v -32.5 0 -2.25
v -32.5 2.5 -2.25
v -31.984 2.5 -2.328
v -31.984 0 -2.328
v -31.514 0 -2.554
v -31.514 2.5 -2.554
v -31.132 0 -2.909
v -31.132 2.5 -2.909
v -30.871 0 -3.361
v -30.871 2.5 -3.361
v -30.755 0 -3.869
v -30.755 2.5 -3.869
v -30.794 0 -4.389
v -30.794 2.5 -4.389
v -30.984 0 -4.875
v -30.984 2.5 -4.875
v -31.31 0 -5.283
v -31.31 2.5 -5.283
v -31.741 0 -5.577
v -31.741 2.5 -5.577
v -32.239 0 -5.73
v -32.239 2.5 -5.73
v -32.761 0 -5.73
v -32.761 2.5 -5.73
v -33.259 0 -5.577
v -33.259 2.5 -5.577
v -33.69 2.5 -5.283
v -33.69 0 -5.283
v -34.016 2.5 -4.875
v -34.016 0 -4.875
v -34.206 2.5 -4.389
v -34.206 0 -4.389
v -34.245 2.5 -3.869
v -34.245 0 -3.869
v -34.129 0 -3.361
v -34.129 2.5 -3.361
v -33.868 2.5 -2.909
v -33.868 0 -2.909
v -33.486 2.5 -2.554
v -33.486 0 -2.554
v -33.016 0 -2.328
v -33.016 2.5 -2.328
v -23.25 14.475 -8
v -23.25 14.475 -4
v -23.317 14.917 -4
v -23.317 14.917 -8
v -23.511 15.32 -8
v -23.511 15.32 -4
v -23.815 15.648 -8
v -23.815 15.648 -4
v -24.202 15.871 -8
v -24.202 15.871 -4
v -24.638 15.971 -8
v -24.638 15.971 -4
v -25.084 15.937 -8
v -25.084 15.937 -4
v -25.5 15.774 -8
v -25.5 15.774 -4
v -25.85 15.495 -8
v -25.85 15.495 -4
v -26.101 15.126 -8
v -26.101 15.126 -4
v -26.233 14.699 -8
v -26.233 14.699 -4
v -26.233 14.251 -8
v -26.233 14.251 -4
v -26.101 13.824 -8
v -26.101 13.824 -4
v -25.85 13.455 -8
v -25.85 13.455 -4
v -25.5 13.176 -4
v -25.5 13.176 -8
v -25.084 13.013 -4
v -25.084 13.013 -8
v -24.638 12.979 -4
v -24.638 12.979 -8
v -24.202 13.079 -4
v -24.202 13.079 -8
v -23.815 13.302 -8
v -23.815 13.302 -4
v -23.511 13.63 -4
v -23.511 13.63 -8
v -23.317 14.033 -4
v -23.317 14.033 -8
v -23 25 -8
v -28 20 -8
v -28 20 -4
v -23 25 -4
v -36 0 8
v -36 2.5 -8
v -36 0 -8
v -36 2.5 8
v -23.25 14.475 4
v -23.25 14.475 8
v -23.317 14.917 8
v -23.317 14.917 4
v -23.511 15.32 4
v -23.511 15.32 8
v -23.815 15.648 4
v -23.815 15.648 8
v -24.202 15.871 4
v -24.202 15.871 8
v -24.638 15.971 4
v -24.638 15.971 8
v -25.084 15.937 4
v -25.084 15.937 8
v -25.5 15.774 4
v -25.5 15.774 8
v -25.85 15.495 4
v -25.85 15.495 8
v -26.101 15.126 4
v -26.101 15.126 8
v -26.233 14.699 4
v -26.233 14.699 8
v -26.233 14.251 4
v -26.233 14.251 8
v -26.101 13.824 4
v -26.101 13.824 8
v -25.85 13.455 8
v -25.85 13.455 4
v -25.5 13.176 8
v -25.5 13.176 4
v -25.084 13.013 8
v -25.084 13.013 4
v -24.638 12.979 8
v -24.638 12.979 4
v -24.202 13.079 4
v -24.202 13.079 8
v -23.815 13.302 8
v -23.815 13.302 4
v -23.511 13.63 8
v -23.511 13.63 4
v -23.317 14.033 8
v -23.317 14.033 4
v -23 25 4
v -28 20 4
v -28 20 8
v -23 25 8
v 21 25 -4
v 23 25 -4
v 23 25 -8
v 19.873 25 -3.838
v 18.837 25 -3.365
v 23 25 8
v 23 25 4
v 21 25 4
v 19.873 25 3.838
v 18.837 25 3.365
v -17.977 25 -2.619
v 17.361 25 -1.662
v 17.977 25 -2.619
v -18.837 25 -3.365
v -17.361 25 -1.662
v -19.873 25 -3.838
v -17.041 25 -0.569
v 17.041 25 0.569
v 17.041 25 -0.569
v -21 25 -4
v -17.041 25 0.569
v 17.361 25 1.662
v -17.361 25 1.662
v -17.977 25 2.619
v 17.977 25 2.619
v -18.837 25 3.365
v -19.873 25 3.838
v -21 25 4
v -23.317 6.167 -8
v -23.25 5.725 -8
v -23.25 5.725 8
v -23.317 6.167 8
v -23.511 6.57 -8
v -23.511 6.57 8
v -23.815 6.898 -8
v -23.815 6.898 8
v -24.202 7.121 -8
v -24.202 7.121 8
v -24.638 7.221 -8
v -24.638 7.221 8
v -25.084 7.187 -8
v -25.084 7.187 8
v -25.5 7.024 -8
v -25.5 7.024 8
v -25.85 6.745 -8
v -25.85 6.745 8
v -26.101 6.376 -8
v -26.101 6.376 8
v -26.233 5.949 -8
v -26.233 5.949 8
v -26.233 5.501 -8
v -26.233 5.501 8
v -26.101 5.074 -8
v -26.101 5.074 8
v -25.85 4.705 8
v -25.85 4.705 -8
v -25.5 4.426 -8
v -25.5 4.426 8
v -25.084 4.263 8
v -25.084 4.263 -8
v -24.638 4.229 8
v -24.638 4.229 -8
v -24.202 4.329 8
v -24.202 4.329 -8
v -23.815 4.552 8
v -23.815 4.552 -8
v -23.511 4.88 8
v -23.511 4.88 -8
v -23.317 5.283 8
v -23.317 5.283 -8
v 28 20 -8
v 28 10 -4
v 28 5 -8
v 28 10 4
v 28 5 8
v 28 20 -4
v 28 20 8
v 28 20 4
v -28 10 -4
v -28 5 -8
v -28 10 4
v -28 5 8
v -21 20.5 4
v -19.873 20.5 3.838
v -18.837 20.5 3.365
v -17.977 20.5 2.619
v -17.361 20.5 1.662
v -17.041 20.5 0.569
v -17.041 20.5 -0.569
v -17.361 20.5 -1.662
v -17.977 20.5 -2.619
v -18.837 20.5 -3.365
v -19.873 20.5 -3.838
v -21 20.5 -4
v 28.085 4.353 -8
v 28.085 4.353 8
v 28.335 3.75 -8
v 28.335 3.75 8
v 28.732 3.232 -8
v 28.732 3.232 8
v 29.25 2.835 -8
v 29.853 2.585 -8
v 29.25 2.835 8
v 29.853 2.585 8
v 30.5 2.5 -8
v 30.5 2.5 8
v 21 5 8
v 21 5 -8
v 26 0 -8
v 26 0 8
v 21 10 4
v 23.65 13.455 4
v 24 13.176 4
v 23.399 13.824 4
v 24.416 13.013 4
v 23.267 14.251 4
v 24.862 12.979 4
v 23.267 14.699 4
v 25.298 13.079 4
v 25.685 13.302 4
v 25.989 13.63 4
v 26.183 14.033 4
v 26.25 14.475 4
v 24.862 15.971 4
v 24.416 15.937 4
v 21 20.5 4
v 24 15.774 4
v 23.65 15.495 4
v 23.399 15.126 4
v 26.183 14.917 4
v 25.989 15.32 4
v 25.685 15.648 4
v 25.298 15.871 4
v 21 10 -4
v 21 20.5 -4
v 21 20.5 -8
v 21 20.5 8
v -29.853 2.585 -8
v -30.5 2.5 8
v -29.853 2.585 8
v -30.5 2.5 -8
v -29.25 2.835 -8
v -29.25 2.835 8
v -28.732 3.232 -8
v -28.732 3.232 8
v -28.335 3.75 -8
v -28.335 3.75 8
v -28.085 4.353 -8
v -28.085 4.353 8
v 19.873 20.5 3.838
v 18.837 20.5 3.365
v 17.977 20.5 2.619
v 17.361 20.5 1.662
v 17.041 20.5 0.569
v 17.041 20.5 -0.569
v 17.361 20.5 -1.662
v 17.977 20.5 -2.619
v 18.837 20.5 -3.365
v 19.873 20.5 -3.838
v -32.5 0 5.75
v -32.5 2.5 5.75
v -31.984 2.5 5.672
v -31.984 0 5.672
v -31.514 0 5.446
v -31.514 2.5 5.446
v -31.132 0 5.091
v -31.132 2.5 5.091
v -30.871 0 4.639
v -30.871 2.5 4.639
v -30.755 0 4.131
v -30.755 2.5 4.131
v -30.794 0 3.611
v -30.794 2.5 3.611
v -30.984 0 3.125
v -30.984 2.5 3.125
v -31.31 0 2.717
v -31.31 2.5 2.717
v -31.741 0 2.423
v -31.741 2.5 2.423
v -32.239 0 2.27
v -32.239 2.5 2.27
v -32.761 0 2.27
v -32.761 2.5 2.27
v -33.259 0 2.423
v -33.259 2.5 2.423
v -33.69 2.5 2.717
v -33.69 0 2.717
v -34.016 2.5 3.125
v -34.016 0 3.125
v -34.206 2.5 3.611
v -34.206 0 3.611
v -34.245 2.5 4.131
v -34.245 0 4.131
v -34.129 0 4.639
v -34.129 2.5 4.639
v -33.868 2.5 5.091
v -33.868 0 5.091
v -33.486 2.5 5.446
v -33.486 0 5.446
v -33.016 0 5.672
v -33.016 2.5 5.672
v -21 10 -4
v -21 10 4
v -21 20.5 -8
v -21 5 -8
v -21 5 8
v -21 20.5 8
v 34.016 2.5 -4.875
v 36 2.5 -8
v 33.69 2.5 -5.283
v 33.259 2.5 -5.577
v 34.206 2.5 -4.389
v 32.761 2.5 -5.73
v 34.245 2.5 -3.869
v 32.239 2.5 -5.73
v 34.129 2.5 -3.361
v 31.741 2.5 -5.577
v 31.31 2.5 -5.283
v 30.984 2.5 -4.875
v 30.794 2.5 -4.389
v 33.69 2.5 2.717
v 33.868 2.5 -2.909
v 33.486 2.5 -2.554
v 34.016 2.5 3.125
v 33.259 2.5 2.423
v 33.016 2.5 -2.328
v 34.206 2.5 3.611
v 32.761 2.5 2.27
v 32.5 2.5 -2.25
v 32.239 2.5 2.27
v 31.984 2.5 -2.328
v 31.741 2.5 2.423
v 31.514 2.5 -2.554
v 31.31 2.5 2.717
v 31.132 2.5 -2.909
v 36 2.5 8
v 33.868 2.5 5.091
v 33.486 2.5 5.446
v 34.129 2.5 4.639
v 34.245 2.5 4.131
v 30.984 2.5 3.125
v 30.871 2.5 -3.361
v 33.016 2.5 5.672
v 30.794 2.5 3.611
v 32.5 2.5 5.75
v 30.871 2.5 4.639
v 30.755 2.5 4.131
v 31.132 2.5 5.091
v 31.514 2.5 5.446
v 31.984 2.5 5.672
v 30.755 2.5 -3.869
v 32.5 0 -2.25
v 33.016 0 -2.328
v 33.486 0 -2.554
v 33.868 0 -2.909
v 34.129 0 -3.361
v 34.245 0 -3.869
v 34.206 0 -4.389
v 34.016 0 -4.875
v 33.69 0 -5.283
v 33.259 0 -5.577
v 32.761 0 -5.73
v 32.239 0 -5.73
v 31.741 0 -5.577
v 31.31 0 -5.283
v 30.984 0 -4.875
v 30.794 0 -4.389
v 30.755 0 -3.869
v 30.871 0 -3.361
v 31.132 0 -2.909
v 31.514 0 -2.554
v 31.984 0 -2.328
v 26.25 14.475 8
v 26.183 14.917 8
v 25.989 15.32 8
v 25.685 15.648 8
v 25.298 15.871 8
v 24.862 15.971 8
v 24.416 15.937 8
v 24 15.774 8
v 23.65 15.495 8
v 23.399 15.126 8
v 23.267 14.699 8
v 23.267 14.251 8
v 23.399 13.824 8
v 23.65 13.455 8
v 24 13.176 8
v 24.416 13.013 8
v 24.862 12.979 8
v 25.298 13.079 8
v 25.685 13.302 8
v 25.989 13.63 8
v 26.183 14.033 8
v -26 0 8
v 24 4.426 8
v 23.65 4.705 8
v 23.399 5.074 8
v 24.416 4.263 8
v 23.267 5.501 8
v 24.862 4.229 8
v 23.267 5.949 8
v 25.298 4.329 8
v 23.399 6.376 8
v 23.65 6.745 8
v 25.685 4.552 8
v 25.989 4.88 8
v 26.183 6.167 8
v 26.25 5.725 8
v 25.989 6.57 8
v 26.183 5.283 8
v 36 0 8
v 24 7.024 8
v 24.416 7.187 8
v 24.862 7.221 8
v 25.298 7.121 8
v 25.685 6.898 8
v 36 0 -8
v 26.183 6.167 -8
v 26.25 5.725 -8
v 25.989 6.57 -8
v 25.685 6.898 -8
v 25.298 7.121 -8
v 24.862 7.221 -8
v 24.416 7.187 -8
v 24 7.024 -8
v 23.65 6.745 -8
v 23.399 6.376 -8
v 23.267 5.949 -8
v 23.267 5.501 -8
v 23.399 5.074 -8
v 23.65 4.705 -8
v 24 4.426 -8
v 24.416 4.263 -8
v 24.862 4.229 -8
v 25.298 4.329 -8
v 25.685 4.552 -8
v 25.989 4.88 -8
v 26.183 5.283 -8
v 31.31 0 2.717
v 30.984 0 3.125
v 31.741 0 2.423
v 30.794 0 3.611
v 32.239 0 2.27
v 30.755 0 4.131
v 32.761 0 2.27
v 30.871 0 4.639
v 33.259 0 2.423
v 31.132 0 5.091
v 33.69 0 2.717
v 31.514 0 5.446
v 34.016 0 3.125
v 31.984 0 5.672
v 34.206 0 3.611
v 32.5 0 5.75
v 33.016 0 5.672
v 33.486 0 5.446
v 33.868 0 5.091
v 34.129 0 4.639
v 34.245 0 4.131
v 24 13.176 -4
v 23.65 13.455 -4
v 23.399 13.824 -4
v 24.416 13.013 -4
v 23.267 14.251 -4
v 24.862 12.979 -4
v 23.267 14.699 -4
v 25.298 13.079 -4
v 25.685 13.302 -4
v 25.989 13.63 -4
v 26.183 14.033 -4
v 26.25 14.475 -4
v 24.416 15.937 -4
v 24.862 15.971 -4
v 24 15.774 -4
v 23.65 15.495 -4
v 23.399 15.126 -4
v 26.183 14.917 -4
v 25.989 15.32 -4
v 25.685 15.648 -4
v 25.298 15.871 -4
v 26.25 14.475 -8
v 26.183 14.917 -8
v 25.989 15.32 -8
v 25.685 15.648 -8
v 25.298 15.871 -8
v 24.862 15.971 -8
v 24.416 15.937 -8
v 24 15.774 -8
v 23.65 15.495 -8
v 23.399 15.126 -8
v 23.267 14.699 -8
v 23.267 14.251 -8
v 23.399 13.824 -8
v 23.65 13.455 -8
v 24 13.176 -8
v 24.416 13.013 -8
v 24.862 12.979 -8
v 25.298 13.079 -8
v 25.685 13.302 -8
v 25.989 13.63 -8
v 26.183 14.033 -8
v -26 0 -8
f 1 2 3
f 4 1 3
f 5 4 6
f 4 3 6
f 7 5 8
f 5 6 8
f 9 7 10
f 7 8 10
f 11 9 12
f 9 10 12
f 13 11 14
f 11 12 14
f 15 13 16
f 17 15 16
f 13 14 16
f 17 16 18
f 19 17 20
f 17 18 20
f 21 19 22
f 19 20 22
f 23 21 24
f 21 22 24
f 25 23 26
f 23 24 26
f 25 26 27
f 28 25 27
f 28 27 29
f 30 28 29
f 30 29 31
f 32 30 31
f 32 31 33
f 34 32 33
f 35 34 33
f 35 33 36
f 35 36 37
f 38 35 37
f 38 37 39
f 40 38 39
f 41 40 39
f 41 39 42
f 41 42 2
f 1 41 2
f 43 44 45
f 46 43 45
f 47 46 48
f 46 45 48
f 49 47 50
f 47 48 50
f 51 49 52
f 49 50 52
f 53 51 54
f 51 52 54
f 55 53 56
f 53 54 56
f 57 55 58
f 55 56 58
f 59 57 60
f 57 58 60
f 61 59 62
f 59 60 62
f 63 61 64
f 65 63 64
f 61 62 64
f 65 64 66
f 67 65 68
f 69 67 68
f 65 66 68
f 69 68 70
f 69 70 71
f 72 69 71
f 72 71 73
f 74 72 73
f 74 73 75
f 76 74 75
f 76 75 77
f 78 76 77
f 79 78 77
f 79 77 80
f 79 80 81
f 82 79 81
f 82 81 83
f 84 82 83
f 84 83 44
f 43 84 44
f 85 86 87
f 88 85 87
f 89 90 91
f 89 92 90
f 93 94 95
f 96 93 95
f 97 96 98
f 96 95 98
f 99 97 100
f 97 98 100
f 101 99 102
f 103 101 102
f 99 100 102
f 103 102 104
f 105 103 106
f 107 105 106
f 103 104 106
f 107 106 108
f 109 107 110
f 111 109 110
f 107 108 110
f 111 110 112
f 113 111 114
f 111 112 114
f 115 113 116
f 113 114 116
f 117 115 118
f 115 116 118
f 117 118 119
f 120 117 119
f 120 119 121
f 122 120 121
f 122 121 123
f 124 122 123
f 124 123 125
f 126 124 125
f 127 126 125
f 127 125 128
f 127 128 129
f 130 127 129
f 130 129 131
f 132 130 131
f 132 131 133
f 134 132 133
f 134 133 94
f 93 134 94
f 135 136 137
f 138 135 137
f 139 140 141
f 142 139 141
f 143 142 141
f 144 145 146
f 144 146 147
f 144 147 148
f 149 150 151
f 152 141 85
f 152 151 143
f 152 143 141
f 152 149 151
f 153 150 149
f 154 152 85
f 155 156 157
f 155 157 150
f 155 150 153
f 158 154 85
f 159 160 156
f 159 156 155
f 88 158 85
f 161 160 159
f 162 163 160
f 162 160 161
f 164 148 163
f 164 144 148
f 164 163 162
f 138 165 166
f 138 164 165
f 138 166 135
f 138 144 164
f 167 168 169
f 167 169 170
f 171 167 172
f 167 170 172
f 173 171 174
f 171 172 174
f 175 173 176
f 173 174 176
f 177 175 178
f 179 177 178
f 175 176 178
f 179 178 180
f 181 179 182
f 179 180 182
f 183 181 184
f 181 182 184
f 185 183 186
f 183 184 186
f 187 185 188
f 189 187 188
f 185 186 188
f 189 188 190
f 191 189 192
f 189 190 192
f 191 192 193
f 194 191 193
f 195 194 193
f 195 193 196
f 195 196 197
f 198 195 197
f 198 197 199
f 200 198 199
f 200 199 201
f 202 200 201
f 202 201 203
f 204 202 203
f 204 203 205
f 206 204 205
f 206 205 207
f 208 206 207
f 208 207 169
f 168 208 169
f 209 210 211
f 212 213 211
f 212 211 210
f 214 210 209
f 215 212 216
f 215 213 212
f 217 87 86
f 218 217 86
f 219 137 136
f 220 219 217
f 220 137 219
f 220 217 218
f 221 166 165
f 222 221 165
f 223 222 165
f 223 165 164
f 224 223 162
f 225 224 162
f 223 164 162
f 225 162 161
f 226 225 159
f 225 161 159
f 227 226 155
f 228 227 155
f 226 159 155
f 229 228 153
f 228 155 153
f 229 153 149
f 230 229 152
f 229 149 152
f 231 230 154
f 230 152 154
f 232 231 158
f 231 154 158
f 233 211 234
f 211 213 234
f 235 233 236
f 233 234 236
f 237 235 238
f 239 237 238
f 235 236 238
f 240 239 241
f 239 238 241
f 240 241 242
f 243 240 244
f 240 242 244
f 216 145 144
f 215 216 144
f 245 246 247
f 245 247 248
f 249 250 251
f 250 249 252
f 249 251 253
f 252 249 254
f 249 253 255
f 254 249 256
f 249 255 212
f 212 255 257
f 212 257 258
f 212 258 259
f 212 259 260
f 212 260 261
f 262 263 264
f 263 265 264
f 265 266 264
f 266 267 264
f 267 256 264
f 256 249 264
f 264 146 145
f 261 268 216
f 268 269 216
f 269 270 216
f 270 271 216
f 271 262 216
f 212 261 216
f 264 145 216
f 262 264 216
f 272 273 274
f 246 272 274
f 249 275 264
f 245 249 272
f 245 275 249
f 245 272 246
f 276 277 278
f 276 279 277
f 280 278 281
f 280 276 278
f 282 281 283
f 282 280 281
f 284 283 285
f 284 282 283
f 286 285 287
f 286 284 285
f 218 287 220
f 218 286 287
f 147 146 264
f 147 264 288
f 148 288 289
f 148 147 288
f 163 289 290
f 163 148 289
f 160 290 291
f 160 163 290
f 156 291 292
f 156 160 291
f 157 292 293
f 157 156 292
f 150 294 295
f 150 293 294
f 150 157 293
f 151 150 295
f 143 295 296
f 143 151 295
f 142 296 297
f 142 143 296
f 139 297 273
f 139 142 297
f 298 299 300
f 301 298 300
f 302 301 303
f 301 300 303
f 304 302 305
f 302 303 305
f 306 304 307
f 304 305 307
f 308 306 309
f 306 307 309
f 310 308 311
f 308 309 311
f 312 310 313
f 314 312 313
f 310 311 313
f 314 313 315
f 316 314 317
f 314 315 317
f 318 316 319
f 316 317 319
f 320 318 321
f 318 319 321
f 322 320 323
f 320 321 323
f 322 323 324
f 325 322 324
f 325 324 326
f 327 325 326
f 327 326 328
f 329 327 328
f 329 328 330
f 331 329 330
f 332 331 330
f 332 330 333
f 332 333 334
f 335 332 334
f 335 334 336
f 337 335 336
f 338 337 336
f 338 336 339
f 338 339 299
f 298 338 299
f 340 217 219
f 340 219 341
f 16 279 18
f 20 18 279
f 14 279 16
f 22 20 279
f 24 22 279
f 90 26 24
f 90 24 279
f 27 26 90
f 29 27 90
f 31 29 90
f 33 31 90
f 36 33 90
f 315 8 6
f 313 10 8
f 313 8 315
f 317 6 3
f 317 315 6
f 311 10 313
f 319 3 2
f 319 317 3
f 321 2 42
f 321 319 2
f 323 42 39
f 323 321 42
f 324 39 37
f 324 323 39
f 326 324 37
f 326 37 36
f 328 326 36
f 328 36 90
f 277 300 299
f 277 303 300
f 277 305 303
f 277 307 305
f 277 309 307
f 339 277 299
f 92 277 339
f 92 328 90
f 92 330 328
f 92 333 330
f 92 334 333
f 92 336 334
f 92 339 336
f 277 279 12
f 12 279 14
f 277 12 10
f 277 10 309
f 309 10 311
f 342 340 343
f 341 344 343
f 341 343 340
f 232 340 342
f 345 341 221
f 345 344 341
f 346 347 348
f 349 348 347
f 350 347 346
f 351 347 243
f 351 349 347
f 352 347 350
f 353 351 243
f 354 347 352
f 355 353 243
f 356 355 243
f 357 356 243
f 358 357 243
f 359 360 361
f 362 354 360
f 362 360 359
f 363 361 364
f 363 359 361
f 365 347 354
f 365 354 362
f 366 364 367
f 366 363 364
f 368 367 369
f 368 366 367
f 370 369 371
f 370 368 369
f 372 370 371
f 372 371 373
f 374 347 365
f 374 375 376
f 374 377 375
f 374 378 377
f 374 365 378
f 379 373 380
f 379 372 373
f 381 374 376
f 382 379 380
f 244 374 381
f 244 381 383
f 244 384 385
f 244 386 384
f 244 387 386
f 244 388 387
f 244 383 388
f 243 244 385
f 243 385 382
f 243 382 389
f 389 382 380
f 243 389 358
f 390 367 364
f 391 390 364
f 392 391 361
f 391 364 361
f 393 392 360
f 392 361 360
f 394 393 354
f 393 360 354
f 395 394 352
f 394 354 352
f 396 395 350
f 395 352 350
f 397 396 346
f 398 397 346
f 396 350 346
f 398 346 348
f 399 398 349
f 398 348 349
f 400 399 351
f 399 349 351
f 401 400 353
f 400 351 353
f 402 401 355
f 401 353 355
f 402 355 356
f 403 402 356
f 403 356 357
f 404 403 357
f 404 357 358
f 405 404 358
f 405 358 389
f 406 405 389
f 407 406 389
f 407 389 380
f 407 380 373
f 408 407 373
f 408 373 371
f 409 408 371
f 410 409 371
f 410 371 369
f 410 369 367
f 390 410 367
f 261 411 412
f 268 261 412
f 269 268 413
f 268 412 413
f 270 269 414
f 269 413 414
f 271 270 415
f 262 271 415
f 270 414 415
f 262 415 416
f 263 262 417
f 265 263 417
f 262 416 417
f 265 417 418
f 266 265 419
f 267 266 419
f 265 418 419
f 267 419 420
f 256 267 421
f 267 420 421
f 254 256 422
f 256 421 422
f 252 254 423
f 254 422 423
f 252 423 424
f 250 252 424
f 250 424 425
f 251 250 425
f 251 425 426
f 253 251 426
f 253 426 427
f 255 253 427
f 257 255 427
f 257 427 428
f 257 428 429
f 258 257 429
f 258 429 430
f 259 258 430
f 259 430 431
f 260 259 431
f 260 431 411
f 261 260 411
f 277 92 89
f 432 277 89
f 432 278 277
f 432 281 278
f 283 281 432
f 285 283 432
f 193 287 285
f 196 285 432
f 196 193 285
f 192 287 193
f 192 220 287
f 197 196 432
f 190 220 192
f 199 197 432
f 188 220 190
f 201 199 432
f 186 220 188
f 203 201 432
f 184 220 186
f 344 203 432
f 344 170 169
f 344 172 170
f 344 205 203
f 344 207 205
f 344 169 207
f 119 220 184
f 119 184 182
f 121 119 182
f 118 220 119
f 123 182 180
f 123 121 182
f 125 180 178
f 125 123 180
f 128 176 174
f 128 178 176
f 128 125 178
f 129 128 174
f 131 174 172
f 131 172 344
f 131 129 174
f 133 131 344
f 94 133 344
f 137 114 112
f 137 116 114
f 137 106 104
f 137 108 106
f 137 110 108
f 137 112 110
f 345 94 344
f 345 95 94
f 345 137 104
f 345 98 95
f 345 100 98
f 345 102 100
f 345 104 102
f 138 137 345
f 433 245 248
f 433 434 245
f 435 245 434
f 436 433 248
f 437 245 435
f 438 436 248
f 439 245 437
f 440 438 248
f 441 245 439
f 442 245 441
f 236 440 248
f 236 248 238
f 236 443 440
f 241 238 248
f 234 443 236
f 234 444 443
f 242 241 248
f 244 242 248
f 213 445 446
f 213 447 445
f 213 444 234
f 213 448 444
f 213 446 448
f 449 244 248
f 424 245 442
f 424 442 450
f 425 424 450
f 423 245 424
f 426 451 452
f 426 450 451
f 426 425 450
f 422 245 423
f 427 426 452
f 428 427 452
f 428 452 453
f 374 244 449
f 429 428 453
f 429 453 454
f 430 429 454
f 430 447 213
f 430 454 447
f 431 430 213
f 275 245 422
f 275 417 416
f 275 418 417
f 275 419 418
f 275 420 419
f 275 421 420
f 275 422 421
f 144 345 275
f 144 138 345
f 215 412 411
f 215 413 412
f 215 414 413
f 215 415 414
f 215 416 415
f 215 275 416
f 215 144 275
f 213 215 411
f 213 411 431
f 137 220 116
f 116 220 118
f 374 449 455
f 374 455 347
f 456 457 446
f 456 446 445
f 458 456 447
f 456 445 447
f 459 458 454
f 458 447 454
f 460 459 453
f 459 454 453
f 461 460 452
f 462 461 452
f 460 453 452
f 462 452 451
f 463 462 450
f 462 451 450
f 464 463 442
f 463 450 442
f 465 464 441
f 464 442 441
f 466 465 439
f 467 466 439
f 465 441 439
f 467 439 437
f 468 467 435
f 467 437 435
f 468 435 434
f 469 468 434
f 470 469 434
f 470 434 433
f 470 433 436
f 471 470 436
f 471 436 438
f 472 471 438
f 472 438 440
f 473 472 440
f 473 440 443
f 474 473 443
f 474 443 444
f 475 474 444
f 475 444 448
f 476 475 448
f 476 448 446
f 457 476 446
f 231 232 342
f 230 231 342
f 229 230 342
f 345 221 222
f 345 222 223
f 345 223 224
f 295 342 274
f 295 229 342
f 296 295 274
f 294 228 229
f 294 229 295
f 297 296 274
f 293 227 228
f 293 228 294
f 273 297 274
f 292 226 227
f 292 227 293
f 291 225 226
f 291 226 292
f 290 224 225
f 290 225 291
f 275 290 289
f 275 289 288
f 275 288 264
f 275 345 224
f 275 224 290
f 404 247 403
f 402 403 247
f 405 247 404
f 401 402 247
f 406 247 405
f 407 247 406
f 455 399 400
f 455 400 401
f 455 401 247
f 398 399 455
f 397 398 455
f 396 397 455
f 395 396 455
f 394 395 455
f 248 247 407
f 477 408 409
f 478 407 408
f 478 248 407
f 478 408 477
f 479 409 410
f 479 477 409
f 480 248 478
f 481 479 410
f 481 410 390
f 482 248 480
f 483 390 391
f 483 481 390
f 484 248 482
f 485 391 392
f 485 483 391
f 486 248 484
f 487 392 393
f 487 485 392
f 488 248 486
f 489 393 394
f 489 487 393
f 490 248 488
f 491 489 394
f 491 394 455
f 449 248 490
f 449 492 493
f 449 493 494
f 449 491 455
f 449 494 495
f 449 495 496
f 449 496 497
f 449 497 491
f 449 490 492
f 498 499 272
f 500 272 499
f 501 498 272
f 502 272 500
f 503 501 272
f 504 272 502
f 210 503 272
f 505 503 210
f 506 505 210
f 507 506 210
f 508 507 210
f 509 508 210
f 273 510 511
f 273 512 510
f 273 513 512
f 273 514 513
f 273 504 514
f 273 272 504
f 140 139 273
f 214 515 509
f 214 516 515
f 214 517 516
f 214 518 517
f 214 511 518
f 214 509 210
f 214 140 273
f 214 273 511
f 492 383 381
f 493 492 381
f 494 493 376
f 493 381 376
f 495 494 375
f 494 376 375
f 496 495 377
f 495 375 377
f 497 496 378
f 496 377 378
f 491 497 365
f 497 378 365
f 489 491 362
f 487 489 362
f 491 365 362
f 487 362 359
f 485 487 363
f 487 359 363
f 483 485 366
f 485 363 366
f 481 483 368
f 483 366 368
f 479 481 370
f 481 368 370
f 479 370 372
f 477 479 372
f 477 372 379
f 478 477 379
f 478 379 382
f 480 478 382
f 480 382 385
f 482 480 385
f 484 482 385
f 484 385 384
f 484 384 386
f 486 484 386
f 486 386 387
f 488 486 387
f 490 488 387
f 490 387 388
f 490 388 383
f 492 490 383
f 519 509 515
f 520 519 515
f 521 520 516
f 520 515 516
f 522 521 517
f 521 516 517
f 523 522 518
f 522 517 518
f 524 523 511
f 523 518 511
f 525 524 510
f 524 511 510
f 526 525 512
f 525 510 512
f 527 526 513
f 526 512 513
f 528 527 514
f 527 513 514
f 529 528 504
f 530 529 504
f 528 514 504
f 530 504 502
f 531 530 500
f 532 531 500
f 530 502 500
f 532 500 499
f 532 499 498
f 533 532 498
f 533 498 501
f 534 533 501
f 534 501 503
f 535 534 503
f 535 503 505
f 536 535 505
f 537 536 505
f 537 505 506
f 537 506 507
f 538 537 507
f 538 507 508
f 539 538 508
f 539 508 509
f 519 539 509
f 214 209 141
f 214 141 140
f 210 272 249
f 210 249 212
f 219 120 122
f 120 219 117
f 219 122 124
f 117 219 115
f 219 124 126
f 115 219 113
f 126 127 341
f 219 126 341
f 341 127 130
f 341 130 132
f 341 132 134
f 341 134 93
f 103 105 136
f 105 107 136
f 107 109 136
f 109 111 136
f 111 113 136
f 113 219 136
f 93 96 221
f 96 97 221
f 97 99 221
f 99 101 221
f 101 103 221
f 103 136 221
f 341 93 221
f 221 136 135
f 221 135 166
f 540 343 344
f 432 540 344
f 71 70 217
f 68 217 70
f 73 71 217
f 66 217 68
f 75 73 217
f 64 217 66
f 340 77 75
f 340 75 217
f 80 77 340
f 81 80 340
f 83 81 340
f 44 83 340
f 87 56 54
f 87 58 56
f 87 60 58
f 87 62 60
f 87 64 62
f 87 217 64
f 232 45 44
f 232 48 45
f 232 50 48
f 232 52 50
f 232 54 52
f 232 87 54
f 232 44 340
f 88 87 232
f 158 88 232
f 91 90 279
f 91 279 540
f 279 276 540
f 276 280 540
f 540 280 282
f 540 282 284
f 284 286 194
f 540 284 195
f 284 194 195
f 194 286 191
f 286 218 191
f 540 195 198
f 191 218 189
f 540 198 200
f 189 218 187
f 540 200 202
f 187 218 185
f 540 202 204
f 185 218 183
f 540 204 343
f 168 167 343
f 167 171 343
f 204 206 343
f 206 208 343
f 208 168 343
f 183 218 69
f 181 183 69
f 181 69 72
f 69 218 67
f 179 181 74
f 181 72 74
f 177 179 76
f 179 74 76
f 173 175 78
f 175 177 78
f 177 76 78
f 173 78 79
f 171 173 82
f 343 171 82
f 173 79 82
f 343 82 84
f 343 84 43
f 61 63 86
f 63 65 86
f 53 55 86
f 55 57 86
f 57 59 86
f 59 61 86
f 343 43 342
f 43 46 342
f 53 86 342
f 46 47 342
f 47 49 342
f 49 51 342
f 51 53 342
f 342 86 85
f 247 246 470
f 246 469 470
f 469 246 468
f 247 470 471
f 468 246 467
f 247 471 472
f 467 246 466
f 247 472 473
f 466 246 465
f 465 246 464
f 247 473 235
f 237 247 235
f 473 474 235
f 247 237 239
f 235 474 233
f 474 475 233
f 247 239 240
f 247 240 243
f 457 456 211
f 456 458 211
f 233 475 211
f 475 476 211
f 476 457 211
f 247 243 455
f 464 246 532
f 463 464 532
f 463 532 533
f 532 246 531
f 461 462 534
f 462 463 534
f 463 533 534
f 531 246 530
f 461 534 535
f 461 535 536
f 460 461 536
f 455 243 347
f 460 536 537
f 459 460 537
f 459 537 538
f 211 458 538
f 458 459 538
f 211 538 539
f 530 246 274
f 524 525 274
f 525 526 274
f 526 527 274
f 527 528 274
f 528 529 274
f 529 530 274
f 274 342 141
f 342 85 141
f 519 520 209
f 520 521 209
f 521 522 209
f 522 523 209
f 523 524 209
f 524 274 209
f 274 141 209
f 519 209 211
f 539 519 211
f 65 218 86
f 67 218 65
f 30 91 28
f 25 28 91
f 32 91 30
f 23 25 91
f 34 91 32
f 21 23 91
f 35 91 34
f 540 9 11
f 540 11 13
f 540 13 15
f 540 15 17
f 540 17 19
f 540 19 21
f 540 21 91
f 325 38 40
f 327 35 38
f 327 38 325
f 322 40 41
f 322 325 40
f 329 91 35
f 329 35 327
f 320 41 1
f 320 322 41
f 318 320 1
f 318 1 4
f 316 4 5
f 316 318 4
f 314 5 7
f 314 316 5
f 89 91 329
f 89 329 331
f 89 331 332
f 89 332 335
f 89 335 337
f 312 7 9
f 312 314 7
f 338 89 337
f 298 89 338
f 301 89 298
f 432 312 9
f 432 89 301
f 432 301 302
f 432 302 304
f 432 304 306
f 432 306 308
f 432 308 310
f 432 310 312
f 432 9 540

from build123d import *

# Parameters (mm, degrees)
BOSS_EXTRUDE1_DEPTH = 8
CHAMFER5_SIZE       = 5
FILLET1_R           = 2.5
SKETCH2_R           = 1.5
CUT_EXTRUDE1_DEPTH  = 47.658332589
SKETCH3_R           = 1.75
CUT_EXTRUDE2_DEPTH  = 44.200115741
SKETCH5_W           = 7
SKETCH5_H           = 8
CUT_EXTRUDE3_DEPTH  = 15
CUT_EXTRUDE5_DEPTH  = 15


with BuildPart() as part:
    # Sketch1 → Boss-Extrude1 (new, symmetric)
    with BuildSketch(Plane.XY):
        Polygon((-36, 0), (-21, 0), (-21, 20.5), (21, 20.5), (21, 0), (36, 0), (36, 2.5), (28, 2.5), (28, 25), (-28, 25), (-28, 2.5), (-36, 2.5), align=None)
    extrude(amount=BOSS_EXTRUDE1_DEPTH, both=True)

    # Chamfer5
    chamfer5_edges = [part.edges().sort_by_distance(p)[0] for p in [
        (-28, 25, 0),
        (28, 25, 0),
        (21, 0, 0),
        (-21, 0, 0),
    ]]
    chamfer(chamfer5_edges, length=CHAMFER5_SIZE)

    # Fillet1
    fillet1_edges = [part.edges().sort_by_distance(p)[0] for p in [
        (-28, 2.5, 0),
        (28, 2.5, 0),
    ]]
    fillet(fillet1_edges, radius=FILLET1_R)

    # Sketch2 → Cut-Extrude1 (cut, through all)
    with BuildSketch(Plane.XY.offset(8)):
        with Locations((-24.75, 14.475)):
            Circle(SKETCH2_R)
        with Locations((-24.75, 5.725)):
            Circle(SKETCH2_R)
        with Locations((24.75, 14.475)):
            Circle(SKETCH2_R)
        with Locations((24.75, 5.725)):
            Circle(SKETCH2_R)
    extrude(amount=-CUT_EXTRUDE1_DEPTH, mode=Mode.SUBTRACT)

    # Sketch3 → Cut-Extrude2 (cut, through all)
    with BuildSketch(Plane(origin=(0, 2.5, 0), x_dir=(1, 0, 0), z_dir=(0, 1, 0))):
        with Locations(Location((32.5, 4, 0), (0, 0, 270))):
            Circle(SKETCH3_R)
        with Locations(Location((32.5, -4, 0), (0, 0, 270))):
            Circle(SKETCH3_R)
        with Locations(Location((-32.5, 4, 0), (0, 0, 270))):
            Circle(SKETCH3_R)
        with Locations(Location((-32.5, -4, 0), (0, 0, 270))):
            Circle(SKETCH3_R)
    extrude(amount=-CUT_EXTRUDE2_DEPTH, mode=Mode.SUBTRACT)

    # Sketch5 → Cut-Extrude3 (cut)
    with BuildSketch(Plane(origin=(0, 25, 0), x_dir=(1, 0, 0), z_dir=(0, 1, 0))):
        with Locations((24.5, 0)):
            Rectangle(SKETCH5_W, SKETCH5_H)
        with Locations((-24.5, 0)):
            Rectangle(SKETCH5_W, SKETCH5_H)
    extrude(amount=-CUT_EXTRUDE3_DEPTH, mode=Mode.SUBTRACT)

    # Sketch7 → Cut-Extrude5 (cut)
    with BuildSketch(Plane(origin=(0, 25, 0), x_dir=(1, 0, 0), z_dir=(0, 1, 0))):
        with BuildLine():
            Line((21, 4), (21, -4))
            ThreePointArc((21, -4), (17, 0), (21, 4))
        make_face()
        with BuildLine():
            Line((-21, 4), (-21, -4))
            ThreePointArc((-21, -4), (-17, 0), (-21, 4))
        make_face()
    extrude(amount=-CUT_EXTRUDE5_DEPTH, mode=Mode.SUBTRACT)


solid = part.part
